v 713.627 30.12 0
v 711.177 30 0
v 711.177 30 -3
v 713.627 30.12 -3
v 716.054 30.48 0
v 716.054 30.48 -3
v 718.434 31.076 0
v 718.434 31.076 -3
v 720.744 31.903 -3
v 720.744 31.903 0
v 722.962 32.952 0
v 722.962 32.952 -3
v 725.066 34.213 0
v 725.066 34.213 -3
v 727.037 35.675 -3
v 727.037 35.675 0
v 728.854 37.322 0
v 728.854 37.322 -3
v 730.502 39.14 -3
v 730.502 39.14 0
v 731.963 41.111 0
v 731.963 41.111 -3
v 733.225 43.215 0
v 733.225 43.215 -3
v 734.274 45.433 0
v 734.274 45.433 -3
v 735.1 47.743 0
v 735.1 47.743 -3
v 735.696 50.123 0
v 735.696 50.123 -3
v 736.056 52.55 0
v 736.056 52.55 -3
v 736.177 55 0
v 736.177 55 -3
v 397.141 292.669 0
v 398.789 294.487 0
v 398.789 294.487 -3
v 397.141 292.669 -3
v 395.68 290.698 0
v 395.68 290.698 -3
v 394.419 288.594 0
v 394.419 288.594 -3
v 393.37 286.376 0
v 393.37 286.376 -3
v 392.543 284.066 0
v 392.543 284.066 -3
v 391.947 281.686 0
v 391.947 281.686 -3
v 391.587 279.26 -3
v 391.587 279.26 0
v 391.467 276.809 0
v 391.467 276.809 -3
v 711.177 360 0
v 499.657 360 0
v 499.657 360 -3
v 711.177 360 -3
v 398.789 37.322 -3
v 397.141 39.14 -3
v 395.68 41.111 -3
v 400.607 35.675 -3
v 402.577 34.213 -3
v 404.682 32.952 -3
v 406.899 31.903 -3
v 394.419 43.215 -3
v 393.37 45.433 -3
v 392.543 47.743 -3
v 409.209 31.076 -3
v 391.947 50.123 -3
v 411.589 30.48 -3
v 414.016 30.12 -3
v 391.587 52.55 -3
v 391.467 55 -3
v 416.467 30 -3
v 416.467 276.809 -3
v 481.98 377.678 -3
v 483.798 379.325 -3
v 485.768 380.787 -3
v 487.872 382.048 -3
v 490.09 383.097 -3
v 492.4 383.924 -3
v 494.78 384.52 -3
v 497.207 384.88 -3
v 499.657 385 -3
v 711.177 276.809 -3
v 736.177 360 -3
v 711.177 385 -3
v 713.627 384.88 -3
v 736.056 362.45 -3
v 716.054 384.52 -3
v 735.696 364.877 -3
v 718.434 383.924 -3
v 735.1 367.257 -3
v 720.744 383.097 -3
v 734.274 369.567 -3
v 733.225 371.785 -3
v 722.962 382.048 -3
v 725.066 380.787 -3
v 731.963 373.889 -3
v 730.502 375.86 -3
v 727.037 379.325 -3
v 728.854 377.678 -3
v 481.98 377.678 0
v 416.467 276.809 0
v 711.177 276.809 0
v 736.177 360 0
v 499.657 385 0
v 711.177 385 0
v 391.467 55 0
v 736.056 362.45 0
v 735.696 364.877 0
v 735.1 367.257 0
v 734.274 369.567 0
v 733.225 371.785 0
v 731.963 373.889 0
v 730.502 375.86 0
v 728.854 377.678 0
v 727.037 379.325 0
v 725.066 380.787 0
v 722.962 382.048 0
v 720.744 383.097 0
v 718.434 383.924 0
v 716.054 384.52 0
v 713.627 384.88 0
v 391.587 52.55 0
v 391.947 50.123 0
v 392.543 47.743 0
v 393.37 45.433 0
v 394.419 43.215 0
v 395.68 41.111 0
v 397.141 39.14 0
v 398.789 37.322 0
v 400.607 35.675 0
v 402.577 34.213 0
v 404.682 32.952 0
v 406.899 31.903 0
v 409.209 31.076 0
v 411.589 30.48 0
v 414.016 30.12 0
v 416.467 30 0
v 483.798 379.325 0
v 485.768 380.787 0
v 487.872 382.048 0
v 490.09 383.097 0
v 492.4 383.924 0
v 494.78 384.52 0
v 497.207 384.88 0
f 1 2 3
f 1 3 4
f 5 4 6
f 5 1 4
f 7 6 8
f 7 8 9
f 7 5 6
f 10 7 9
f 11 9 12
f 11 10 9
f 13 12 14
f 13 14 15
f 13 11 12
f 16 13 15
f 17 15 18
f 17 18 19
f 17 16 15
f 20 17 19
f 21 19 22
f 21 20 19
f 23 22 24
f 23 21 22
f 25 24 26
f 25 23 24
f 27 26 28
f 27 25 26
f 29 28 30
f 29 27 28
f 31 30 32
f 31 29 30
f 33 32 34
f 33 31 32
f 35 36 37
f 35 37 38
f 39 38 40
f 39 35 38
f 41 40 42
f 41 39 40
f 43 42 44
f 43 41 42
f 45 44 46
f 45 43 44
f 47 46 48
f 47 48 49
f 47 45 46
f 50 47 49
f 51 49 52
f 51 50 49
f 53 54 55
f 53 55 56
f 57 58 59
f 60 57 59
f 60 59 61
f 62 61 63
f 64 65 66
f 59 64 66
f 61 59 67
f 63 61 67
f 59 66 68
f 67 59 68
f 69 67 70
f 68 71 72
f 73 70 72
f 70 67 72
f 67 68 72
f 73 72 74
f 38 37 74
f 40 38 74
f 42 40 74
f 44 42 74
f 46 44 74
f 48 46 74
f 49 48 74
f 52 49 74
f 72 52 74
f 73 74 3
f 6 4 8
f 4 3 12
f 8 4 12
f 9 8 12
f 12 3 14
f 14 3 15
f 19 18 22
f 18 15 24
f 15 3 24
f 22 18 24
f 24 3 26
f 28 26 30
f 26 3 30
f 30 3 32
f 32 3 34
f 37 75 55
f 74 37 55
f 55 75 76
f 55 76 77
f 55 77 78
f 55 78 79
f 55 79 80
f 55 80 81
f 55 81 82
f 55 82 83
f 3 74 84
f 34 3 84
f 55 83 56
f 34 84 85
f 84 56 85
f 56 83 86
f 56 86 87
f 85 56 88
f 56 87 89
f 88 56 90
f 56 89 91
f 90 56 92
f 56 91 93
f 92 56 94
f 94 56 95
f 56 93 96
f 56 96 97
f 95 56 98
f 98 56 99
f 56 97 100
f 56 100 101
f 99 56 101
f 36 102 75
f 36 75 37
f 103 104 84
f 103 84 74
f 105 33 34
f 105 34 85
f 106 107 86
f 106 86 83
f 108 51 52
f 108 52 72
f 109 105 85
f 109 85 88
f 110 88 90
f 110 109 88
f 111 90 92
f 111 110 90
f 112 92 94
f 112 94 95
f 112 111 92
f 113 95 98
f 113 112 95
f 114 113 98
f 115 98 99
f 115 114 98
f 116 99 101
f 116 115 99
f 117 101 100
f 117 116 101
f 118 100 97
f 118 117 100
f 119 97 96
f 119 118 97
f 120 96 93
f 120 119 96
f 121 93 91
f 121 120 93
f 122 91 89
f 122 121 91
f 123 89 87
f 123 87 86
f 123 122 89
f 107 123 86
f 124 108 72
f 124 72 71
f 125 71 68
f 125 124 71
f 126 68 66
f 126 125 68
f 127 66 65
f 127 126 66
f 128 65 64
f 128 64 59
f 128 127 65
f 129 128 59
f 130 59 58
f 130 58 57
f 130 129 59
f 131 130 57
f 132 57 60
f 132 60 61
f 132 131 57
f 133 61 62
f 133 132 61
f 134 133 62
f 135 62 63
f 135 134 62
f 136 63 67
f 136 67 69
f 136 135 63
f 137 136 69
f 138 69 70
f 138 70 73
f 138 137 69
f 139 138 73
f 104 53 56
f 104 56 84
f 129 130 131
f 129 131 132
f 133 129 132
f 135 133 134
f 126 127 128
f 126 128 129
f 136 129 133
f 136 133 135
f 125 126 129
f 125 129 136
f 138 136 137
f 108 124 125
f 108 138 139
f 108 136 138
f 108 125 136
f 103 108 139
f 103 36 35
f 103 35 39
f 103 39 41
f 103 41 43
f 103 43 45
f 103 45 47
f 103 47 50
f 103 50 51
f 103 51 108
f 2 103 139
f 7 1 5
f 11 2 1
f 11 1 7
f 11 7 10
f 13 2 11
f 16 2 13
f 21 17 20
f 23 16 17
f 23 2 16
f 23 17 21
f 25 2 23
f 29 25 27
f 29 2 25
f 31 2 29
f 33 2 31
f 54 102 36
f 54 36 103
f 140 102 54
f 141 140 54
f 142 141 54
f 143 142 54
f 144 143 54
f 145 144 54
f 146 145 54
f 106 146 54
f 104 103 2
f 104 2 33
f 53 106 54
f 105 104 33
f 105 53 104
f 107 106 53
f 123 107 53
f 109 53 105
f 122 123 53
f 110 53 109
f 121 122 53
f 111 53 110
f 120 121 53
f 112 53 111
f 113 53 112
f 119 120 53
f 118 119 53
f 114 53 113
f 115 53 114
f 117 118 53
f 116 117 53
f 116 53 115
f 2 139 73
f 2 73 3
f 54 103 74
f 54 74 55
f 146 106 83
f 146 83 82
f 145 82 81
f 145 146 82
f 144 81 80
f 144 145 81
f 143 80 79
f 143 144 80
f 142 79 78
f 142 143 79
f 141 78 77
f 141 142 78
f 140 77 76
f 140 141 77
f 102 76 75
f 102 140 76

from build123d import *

# Parameters (mm, degrees)
BOSS_EXTRUDE1_DEPTH = 3


with BuildPart() as part:
    # Sketch1 → Boss-Extrude1 (new body)
    with BuildSketch(Plane.XY):
        with BuildLine():
            Line((711.17673453, 385), (499.657382069, 385))
            ThreePointArc((499.657382069, 385), (490.09029626, 383.096988313), (481.979712539, 377.67766953))
            Line((481.979712539, 377.67766953), (398.788878519, 294.486835509))
            ThreePointArc((398.788878519, 294.486835509), (393.369559736, 286.376251789), (391.466548048, 276.80916598))
            Line((391.466548048, 276.80916598), (391.466548048, 55))
            ThreePointArc((391.466548048, 55), (398.788878519, 37.32233047), (416.466548048, 30))
            Line((416.466548048, 30), (711.17673453, 30))
            ThreePointArc((711.17673453, 30), (728.85440406, 37.32233047), (736.17673453, 55))
            Line((736.17673453, 55), (736.17673453, 360))
            ThreePointArc((736.17673453, 360), (728.85440406, 377.67766953), (711.17673453, 385))
        make_face()
        Polygon((416.466548048, 276.80916598), (499.657382069, 360), (711.17673453, 360), (711.17673453, 276.80916598), align=None, mode=Mode.SUBTRACT)
    extrude(amount=-BOSS_EXTRUDE1_DEPTH)


solid = part.part
